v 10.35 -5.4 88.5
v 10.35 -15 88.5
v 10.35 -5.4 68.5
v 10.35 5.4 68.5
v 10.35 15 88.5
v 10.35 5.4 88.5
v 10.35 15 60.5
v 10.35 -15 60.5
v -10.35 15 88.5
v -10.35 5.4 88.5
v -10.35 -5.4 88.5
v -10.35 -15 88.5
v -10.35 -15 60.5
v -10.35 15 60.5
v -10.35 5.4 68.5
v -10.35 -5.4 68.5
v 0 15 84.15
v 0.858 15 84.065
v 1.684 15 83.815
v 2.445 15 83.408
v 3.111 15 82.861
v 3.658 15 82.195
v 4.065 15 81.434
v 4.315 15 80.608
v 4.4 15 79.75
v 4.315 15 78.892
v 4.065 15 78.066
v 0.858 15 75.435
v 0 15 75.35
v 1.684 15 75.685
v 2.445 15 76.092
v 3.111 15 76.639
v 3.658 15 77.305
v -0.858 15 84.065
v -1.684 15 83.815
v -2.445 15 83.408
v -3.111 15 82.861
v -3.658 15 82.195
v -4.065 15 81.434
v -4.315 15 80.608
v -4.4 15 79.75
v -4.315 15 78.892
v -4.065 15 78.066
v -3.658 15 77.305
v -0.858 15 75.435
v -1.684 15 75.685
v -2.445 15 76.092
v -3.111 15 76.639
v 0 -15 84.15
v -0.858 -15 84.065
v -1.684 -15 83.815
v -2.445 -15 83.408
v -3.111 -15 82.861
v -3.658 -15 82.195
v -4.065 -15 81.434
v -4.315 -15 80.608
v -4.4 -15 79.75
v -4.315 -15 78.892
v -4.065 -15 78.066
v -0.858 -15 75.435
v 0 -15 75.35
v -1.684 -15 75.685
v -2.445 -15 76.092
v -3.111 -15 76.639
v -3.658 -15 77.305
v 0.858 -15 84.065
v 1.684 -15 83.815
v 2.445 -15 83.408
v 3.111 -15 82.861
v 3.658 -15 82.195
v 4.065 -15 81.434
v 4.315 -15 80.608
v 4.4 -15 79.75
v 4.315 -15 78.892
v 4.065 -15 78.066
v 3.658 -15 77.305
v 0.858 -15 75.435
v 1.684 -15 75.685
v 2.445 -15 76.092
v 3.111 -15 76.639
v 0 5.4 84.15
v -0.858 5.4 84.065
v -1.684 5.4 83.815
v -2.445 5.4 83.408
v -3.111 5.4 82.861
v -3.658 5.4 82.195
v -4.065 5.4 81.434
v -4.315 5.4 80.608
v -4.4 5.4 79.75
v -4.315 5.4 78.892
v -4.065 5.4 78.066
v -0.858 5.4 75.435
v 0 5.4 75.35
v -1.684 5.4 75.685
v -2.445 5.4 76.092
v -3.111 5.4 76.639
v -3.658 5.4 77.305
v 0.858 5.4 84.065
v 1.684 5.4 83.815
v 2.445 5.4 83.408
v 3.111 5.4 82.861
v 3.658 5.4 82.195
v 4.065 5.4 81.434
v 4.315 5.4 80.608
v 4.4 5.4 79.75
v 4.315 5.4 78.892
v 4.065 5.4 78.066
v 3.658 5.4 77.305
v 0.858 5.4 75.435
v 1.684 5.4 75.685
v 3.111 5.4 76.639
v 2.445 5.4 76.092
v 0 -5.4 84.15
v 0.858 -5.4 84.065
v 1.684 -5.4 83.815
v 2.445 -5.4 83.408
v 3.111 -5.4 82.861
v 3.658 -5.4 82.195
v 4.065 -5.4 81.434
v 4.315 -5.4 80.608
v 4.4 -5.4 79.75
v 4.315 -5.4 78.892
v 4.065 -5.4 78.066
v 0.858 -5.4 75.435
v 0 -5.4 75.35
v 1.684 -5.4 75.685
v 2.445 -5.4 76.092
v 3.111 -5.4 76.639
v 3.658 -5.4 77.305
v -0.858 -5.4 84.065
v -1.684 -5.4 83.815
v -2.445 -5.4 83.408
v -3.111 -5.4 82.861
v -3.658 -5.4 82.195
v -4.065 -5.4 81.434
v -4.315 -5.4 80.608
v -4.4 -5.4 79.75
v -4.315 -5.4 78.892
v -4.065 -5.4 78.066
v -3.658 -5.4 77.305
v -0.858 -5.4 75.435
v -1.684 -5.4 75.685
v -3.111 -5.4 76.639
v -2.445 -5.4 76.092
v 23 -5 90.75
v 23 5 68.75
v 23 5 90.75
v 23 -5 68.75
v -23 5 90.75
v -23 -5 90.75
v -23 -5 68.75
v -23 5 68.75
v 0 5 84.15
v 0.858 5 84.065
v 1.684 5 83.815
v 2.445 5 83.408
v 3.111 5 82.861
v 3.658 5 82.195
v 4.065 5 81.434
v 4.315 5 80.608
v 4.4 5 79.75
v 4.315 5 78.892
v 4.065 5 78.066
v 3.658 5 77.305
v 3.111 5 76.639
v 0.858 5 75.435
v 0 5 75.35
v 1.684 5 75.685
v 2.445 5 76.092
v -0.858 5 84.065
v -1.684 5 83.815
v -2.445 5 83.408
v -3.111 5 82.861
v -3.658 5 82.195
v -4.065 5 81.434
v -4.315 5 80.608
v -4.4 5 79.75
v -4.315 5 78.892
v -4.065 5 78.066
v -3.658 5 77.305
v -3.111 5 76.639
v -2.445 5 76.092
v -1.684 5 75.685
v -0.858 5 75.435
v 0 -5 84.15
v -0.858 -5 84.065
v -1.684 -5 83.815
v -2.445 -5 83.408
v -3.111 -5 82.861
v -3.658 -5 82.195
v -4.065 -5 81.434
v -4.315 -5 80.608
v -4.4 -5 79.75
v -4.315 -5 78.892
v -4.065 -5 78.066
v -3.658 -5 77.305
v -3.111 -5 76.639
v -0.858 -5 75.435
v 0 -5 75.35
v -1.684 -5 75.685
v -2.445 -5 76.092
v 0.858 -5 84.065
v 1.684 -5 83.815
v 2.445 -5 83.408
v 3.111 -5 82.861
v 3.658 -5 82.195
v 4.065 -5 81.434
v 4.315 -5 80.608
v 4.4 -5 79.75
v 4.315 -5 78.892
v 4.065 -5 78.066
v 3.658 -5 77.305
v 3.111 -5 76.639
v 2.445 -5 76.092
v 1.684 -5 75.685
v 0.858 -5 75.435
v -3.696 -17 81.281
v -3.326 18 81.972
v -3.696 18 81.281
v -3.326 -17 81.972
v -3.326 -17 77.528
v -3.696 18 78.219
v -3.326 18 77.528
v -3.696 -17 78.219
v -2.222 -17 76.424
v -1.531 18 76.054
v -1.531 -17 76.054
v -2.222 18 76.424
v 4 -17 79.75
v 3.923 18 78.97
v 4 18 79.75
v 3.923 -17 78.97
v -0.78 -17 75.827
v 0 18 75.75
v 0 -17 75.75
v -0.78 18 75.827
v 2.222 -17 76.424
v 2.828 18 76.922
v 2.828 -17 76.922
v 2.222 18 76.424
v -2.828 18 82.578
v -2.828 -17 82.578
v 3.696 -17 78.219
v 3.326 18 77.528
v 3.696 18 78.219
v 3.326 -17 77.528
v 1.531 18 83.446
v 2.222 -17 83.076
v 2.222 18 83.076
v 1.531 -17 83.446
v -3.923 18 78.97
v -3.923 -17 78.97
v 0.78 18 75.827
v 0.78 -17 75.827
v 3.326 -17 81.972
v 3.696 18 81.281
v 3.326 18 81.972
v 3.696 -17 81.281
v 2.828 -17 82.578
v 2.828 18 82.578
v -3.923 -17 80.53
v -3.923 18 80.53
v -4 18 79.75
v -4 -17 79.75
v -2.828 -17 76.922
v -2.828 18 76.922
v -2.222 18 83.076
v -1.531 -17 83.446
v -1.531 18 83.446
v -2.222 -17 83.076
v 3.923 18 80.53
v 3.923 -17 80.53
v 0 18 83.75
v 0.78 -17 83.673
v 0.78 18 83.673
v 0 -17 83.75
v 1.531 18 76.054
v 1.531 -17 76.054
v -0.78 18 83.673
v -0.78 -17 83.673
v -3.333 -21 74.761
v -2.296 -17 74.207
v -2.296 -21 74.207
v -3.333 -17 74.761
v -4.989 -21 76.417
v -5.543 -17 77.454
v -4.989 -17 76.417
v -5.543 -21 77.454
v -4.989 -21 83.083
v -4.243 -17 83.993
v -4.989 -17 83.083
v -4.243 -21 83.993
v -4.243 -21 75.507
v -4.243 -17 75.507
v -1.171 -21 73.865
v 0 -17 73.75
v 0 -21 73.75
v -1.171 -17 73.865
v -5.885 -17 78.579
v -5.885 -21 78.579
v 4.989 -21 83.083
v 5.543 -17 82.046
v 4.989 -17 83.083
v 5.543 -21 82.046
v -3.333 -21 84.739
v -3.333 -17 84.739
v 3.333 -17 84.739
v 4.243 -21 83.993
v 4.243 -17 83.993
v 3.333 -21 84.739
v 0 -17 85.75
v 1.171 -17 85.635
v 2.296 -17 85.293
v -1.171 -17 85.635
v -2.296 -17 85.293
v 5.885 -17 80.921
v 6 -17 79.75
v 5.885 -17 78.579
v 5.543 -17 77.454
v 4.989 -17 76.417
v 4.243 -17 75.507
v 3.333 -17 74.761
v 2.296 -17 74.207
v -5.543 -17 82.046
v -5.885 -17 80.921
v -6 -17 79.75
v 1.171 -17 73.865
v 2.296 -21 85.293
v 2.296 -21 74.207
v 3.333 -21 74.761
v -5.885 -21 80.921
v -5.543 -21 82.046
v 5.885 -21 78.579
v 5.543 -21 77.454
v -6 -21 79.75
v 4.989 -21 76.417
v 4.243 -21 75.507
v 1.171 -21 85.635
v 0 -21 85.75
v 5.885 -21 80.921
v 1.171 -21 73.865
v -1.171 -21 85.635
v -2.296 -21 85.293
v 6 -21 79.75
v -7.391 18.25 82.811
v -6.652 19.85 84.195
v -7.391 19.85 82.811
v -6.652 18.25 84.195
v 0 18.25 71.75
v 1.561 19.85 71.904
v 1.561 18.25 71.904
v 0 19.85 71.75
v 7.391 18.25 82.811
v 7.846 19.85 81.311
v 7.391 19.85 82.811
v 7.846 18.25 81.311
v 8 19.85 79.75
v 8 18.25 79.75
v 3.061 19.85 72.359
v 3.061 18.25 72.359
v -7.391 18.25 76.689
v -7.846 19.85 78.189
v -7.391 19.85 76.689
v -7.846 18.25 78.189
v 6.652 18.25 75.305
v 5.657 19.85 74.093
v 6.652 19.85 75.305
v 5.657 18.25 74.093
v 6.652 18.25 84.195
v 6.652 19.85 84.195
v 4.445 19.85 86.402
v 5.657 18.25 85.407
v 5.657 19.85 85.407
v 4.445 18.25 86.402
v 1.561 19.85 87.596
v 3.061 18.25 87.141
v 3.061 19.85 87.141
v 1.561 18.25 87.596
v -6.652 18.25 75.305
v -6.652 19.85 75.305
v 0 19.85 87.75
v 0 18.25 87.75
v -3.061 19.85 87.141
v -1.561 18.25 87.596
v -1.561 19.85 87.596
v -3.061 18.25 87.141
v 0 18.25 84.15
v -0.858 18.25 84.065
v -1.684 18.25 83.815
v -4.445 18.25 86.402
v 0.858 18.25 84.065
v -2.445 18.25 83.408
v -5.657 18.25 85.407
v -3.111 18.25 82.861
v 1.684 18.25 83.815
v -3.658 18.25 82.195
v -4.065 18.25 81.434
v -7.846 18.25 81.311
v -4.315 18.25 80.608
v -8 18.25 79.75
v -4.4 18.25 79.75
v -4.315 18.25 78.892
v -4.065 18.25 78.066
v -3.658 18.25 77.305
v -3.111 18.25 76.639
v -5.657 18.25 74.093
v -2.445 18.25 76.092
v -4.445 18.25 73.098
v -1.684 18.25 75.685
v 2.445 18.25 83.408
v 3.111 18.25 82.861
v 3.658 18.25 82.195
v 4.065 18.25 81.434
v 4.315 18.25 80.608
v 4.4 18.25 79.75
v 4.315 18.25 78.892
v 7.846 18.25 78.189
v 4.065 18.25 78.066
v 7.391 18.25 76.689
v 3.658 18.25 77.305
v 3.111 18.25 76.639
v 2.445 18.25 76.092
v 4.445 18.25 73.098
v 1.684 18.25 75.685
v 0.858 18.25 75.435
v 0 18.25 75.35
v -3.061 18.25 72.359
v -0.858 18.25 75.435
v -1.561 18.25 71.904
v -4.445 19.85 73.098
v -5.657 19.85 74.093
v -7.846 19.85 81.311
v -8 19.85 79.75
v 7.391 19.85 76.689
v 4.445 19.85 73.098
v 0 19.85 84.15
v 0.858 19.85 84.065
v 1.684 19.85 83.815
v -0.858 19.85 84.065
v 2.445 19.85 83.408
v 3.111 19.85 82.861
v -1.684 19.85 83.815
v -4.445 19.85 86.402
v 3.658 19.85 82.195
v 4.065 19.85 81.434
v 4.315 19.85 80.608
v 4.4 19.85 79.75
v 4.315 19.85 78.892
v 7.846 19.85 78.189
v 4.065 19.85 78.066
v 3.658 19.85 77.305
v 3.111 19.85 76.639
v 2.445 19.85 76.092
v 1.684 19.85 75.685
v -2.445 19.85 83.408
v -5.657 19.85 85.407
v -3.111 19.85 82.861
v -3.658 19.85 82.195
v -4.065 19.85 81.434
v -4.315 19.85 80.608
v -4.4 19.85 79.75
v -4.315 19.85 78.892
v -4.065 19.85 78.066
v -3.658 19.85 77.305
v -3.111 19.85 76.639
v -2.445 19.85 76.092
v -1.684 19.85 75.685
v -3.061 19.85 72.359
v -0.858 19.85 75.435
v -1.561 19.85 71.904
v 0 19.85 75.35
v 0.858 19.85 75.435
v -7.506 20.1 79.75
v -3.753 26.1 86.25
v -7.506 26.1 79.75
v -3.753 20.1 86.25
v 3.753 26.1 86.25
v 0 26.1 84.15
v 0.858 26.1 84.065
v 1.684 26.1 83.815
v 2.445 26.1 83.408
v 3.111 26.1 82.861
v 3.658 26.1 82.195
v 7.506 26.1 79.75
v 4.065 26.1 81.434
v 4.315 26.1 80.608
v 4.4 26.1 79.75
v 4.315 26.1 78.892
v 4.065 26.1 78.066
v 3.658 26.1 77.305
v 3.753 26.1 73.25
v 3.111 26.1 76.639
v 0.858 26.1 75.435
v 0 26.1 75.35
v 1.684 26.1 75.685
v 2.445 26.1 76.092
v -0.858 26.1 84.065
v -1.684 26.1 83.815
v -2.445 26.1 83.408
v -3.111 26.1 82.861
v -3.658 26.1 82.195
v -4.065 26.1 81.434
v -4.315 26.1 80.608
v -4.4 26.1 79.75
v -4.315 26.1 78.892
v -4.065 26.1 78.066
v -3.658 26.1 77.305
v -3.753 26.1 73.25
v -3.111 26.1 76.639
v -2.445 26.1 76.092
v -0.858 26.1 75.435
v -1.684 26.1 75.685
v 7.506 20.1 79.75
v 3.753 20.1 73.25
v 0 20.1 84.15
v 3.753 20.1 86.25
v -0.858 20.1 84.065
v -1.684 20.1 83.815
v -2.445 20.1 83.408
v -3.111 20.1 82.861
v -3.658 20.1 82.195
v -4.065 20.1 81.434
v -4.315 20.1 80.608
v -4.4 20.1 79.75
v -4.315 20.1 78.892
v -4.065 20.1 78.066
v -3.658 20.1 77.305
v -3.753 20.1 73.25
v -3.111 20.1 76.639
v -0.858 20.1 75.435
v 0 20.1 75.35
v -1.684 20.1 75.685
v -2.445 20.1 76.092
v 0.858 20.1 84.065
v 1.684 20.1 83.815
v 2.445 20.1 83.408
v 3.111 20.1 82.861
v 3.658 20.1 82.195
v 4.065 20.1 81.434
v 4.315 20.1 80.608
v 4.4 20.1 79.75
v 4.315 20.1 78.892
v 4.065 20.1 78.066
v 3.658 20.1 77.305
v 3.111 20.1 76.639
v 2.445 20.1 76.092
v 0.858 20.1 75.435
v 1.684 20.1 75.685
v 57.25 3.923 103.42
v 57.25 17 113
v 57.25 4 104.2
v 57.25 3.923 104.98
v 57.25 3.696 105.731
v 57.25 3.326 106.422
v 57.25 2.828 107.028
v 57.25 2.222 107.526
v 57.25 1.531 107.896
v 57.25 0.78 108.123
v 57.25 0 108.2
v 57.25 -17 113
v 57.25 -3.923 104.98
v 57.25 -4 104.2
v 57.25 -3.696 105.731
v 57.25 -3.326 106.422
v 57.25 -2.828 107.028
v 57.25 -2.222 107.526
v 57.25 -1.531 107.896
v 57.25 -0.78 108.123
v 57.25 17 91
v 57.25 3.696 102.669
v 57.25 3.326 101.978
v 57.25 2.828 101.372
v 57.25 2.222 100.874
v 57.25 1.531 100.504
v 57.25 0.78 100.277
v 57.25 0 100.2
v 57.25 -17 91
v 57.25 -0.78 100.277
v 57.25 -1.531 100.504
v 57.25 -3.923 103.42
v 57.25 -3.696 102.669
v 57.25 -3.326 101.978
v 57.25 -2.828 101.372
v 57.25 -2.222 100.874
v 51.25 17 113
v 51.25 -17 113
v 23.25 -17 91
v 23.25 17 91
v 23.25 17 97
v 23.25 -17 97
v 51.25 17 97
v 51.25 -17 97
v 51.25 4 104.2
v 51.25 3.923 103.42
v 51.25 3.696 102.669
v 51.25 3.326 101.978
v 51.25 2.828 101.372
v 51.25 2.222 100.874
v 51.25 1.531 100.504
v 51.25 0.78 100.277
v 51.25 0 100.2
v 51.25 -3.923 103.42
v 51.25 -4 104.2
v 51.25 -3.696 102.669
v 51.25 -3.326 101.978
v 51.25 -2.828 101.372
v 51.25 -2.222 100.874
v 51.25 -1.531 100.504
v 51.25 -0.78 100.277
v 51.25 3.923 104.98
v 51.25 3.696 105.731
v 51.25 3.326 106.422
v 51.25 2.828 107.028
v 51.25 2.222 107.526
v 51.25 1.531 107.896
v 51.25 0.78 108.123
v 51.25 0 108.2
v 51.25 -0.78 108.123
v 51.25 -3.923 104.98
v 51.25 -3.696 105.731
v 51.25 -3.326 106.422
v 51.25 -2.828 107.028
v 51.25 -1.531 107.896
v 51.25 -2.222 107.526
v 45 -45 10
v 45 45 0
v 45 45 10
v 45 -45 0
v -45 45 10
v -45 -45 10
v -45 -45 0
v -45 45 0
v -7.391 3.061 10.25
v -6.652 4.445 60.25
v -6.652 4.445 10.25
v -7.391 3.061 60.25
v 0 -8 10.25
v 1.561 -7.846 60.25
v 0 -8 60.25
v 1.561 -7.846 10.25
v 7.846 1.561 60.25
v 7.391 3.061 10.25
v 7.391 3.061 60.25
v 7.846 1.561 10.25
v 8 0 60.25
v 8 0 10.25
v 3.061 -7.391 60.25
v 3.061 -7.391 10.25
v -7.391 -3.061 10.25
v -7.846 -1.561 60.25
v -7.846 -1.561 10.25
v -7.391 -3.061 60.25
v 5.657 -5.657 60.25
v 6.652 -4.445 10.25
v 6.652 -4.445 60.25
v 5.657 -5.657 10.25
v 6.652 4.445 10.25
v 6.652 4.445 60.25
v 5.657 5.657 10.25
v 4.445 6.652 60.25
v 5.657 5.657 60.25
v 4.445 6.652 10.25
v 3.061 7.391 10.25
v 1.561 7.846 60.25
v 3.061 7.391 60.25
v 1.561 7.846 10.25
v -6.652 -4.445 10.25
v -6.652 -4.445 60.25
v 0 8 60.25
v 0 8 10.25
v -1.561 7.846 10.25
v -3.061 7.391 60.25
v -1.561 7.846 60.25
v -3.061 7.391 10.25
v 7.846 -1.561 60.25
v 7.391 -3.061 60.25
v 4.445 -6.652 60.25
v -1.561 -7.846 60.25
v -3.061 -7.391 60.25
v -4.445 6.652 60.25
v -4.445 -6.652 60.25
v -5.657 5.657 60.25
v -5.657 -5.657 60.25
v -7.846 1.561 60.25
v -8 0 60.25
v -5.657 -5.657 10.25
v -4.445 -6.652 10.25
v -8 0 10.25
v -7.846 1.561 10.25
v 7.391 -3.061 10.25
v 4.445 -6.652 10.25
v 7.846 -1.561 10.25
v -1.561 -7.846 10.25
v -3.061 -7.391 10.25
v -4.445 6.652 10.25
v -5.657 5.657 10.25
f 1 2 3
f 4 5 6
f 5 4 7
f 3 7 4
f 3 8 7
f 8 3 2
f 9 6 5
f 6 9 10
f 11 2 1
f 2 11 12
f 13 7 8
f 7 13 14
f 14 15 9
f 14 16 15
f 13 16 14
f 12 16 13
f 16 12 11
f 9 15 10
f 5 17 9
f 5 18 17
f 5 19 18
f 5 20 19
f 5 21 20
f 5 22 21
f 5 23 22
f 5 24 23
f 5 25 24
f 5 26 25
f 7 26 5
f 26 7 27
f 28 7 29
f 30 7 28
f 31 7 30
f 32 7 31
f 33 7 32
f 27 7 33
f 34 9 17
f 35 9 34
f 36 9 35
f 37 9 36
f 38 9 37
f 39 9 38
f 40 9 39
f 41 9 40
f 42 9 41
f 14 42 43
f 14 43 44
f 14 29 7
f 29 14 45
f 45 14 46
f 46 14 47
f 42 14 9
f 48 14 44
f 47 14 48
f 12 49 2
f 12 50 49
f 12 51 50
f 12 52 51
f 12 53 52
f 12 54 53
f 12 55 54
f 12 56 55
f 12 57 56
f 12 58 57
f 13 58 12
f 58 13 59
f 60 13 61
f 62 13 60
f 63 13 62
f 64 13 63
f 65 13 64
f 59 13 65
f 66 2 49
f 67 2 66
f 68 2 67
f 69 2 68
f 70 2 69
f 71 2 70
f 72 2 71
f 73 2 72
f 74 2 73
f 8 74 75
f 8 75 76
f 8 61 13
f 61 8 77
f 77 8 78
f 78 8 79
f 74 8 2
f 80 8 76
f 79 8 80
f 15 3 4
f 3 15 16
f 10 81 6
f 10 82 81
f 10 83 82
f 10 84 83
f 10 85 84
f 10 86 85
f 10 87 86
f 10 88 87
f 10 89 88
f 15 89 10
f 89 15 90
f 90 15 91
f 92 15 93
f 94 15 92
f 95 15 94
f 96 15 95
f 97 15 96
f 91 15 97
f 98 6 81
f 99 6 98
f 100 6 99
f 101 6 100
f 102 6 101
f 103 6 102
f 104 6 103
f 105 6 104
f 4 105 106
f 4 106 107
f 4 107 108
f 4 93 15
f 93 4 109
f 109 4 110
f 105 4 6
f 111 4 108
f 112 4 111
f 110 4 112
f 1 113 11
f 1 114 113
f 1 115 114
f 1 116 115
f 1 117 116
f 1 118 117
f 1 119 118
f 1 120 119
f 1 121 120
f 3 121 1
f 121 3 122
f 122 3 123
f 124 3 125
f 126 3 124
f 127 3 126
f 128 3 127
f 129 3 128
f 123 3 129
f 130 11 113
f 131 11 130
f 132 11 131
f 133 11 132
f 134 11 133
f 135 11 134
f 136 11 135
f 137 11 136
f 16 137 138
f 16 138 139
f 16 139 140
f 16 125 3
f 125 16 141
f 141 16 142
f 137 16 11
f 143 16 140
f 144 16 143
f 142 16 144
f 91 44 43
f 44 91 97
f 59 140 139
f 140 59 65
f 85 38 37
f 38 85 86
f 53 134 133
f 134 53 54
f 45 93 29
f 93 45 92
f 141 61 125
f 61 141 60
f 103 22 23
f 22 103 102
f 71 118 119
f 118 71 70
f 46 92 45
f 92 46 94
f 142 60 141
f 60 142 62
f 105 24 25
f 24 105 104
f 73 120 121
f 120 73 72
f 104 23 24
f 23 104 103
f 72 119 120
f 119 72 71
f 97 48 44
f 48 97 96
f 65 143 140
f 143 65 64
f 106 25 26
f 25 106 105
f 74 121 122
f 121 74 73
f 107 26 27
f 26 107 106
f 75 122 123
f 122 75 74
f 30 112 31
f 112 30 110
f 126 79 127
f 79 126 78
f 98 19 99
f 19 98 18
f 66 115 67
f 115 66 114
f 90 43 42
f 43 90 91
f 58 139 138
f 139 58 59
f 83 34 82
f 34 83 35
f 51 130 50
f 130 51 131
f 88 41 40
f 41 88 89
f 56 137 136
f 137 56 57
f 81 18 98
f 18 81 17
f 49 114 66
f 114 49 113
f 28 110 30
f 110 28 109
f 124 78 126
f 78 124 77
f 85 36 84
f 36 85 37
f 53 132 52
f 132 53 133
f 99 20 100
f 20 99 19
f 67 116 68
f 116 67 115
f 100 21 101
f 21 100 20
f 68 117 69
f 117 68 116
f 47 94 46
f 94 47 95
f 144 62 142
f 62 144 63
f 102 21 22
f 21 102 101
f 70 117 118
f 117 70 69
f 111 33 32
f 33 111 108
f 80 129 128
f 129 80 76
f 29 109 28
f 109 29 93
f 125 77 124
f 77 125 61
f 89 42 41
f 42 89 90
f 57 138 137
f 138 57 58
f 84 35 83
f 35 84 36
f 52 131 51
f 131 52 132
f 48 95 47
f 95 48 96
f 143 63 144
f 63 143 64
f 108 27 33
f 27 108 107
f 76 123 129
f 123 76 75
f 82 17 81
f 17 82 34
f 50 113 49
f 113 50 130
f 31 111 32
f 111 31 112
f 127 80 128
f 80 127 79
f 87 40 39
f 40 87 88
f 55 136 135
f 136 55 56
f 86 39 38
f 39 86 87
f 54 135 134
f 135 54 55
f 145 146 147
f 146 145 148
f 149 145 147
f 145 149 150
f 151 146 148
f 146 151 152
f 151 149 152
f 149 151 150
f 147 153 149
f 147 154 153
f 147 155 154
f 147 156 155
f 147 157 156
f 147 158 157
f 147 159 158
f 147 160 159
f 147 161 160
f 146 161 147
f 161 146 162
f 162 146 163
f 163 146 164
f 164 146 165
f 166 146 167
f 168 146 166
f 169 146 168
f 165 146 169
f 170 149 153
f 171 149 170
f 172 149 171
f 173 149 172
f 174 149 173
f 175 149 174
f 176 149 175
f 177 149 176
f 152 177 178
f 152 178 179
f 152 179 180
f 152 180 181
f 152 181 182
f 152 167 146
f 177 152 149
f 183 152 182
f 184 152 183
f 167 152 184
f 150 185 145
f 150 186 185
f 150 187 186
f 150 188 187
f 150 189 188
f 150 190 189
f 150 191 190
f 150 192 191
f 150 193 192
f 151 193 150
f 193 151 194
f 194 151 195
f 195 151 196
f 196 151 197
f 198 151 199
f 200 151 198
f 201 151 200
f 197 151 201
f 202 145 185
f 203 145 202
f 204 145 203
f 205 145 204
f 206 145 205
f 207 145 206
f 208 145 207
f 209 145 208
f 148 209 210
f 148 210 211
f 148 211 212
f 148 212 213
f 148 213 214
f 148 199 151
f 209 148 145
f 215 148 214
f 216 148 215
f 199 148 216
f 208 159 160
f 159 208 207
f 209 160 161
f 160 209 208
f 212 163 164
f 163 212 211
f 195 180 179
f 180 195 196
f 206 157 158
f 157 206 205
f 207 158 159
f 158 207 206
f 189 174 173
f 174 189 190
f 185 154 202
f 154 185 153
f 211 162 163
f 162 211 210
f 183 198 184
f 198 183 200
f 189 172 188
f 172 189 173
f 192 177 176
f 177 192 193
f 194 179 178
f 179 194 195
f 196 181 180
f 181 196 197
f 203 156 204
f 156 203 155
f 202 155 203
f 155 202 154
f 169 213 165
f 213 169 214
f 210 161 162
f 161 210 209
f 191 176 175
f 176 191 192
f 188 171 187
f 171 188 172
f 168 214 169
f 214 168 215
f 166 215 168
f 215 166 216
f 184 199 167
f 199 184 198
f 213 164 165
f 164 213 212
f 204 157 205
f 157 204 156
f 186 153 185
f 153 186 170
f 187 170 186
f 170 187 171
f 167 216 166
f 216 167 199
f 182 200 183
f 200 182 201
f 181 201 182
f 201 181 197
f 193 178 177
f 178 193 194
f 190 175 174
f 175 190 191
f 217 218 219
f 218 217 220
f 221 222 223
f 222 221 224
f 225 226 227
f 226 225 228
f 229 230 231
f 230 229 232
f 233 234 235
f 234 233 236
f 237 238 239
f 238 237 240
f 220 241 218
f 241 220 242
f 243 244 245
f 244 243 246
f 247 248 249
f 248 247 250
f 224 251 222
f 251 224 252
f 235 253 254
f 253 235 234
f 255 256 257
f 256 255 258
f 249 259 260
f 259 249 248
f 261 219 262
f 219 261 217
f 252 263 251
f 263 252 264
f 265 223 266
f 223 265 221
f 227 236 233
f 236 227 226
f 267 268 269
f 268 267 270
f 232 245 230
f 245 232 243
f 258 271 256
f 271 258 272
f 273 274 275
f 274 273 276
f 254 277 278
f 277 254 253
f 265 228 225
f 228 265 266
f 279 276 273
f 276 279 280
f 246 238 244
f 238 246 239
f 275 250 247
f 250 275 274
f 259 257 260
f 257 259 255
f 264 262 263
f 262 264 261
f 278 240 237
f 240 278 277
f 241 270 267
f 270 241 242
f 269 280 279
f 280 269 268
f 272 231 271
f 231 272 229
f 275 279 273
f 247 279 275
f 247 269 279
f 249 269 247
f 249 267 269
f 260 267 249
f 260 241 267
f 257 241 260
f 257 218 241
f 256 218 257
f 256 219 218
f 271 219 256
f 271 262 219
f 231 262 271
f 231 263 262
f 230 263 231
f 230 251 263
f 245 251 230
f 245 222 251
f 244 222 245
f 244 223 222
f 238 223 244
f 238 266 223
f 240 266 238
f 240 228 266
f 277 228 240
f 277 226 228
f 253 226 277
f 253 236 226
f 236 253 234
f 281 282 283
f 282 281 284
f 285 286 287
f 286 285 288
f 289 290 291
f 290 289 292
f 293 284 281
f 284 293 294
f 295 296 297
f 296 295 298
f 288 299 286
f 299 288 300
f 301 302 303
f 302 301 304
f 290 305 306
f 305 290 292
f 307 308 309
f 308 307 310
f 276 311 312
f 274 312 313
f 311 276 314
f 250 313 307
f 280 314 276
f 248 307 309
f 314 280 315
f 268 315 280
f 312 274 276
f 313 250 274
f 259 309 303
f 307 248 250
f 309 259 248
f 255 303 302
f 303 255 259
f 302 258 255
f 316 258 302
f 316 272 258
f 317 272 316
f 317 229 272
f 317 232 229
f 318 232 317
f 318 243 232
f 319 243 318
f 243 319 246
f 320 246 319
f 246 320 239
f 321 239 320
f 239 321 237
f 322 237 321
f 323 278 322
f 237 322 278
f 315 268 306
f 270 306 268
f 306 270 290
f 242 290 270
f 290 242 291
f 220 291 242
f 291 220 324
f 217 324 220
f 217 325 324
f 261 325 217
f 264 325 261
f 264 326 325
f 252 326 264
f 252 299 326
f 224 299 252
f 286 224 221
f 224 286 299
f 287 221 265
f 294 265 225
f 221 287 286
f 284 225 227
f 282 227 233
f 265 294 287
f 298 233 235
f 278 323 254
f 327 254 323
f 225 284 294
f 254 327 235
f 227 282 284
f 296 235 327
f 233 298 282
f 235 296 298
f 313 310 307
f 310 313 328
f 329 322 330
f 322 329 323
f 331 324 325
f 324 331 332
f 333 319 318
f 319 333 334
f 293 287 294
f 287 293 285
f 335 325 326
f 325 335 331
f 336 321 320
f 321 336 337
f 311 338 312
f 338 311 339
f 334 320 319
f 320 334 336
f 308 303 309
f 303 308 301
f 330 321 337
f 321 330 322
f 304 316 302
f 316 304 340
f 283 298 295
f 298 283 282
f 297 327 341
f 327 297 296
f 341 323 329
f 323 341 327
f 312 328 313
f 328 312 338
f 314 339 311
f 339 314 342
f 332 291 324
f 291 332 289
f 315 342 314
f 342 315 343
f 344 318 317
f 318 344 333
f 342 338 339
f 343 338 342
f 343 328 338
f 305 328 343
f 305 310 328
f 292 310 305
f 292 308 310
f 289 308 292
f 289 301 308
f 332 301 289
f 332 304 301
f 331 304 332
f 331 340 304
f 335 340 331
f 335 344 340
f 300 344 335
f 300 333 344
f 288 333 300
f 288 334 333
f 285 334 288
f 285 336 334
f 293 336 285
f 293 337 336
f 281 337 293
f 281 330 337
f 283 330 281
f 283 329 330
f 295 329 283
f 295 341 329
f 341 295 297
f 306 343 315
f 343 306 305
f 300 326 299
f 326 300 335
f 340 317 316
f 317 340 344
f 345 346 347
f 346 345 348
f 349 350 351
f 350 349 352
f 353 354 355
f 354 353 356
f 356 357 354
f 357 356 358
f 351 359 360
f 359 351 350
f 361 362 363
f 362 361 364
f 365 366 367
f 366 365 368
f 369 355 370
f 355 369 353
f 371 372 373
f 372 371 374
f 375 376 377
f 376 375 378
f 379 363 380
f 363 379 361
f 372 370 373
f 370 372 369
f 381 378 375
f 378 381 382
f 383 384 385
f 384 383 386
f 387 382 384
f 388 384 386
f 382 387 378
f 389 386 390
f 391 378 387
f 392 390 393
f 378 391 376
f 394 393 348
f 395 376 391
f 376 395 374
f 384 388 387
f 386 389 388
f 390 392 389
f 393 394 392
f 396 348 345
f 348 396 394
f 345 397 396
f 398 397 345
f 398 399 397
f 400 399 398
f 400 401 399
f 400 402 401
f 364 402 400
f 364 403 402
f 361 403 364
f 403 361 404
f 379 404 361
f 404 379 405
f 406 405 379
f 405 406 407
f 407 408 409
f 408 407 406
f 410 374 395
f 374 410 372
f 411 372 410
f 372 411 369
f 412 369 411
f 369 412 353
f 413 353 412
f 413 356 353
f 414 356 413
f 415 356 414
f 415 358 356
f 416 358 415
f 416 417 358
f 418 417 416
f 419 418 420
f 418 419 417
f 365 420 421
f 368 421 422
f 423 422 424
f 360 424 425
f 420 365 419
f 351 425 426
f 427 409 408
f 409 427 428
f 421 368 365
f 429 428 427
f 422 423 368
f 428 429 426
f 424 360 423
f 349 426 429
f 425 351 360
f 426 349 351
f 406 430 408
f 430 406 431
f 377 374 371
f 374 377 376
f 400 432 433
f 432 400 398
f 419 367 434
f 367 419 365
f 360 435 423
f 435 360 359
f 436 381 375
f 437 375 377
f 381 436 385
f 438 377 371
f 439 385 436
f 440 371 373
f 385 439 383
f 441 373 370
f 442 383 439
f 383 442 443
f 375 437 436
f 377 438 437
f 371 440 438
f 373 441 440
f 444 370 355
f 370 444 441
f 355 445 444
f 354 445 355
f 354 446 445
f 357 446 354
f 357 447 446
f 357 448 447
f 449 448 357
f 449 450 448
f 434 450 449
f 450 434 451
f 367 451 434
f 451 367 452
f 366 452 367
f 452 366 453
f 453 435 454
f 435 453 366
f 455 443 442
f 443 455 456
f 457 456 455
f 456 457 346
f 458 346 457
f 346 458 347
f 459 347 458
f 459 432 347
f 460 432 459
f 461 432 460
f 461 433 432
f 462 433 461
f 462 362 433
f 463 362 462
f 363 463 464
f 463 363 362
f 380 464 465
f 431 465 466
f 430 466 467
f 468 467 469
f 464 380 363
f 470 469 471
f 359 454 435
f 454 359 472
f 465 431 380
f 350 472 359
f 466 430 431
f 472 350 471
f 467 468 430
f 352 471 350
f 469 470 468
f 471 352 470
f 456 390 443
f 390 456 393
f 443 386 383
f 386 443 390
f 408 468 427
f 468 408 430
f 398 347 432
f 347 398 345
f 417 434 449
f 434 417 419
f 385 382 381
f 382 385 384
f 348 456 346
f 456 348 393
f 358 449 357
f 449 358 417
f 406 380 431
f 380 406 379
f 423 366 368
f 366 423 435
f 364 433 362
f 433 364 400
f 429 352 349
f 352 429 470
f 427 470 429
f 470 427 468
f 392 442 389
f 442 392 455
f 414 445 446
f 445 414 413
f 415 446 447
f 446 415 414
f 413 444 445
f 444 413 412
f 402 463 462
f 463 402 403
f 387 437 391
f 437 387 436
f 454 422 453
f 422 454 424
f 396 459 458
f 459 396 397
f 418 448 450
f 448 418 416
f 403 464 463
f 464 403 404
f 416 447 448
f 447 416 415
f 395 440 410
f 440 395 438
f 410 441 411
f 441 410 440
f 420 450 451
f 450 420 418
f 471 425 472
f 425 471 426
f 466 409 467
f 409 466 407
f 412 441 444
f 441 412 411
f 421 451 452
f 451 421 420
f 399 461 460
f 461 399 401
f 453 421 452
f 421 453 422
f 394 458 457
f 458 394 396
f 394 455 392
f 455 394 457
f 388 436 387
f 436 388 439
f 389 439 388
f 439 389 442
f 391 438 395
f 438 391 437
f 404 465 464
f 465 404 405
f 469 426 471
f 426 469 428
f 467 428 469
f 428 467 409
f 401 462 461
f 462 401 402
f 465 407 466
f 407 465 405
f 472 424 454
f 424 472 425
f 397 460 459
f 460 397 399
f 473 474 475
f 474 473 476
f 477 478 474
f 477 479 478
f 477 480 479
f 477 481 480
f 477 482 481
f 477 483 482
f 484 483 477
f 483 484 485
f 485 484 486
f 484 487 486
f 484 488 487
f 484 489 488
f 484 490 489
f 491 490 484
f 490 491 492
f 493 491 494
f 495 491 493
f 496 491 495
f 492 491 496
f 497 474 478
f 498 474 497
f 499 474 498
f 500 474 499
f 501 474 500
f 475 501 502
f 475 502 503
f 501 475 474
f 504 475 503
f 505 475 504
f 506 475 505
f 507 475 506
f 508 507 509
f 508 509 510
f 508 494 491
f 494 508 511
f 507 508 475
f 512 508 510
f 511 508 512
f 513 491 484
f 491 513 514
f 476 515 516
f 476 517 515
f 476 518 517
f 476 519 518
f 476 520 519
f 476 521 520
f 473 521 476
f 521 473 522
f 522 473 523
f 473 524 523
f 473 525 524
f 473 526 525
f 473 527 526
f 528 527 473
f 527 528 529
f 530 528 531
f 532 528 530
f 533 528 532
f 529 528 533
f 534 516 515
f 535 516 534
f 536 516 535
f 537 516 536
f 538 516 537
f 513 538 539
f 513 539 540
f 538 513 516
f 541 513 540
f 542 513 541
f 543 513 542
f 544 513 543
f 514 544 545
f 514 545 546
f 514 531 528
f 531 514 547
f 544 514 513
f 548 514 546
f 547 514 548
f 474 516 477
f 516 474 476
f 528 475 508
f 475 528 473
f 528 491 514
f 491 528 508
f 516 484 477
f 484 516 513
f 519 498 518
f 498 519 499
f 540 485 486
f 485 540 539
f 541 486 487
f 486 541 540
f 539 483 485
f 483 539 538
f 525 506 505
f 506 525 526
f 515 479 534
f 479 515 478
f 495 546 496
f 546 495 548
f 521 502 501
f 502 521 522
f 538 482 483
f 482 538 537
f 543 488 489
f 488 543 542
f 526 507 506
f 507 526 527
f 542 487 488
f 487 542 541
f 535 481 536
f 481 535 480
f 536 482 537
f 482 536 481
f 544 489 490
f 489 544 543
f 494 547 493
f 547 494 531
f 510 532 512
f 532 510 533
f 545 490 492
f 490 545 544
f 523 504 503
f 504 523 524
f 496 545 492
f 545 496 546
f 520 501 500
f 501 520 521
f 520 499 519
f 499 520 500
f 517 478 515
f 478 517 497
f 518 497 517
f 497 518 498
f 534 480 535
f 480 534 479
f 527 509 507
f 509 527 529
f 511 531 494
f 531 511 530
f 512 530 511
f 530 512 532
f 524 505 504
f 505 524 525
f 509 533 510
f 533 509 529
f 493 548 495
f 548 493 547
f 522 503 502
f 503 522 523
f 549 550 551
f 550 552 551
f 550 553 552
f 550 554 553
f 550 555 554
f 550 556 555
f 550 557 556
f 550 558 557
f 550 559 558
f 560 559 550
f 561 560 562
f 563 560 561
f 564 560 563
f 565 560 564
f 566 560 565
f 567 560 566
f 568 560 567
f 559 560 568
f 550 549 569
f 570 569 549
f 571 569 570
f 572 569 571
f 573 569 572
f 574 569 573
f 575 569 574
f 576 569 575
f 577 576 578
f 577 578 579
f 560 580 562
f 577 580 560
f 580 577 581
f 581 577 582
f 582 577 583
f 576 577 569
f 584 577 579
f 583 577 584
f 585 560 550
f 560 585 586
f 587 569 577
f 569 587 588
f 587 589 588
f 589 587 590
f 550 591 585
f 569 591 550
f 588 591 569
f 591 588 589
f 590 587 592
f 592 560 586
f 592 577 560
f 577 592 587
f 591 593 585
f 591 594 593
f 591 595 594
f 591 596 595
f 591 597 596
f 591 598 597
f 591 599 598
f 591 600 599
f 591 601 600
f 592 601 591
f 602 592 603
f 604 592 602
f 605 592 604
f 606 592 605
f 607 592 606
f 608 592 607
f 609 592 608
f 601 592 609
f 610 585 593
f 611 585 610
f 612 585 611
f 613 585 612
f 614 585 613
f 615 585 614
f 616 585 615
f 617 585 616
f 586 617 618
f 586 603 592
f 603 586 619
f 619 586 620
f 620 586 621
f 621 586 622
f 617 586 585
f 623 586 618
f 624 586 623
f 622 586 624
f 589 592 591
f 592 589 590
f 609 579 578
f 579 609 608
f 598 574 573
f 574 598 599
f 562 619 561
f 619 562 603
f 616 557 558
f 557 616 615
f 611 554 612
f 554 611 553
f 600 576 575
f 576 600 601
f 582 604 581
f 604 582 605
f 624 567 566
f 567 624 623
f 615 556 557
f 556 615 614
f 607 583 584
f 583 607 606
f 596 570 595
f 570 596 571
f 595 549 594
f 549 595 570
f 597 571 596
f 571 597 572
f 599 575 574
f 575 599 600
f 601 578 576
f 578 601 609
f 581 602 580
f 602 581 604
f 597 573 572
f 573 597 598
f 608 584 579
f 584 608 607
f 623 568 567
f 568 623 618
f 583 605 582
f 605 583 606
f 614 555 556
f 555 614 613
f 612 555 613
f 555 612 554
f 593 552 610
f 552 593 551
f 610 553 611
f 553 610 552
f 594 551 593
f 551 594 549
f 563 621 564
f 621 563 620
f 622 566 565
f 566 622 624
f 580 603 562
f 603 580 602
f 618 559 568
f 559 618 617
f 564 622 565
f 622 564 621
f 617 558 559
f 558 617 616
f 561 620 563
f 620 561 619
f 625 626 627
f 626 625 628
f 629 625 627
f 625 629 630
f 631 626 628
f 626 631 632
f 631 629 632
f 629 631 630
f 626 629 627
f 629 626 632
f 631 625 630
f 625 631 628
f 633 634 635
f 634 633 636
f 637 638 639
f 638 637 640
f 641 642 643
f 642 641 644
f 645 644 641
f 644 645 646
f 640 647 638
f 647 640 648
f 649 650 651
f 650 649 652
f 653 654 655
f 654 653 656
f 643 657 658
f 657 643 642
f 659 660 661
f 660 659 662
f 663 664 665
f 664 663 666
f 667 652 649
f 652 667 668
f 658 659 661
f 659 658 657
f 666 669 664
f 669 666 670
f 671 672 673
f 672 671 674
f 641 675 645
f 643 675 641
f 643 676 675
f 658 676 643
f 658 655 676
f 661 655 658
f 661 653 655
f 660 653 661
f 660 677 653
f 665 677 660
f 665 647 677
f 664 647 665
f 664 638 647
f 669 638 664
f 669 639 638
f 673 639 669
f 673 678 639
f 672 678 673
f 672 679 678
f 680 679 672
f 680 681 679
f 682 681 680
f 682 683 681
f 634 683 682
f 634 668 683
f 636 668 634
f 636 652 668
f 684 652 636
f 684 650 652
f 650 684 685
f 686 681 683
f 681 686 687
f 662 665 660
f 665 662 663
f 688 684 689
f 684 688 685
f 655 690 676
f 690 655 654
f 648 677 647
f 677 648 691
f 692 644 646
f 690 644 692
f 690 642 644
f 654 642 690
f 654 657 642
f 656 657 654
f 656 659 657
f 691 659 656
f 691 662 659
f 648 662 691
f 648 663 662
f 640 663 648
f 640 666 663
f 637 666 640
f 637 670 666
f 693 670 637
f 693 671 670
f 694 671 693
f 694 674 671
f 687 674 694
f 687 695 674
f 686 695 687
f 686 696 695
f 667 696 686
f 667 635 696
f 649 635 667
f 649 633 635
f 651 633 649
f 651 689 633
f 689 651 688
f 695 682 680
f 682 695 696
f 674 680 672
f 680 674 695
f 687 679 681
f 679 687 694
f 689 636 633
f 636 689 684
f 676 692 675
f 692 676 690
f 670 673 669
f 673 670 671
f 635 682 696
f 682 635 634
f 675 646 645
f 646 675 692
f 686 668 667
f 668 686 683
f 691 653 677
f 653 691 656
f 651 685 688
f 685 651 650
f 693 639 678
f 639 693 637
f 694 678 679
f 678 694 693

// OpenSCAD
$fn = 32;

// ------------------------------------------------------------------------
// Lamp arm: column d16 x 50 mm, arm 46 mm
// Every part is its own module, assembly() places every instance.
// ------------------------------------------------------------------------

// --- part 1 ---
module lamp_base() {
  difference() {
    translate([-45, -45, 0]) cube([90, 90, 10]);
  }
}

// --- part 2 ---
module lamp_column() {
  cylinder(h = 50, d = 16);
}

// --- part 3 ---
module head_fork() {
  difference() {
    translate([-10.35, -15, 0]) cube([20.7, 30, 28]);
    translate([-11.35, -5.4, 8]) cube([22.7, 10.8, 21]);
    translate([0, 0, 19.25]) rotate([90, 0, 0]) cylinder(h = 32, d = 8.8, center = true);
  }
}

// --- part 4 ---
module lamp_arm() {
  difference() {
    translate([-23, -5, 0]) cube([46, 10, 22]);
    translate([0, 0, 11]) rotate([90, 0, 0]) cylinder(h = 12, d = 8.8, center = true);
  }
}

// --- part 5 ---
module arm_pin() {
  rotate([0, 90, 0]) cylinder(h = 36, d = 8, center = true);
  translate([-21, 0, 0]) rotate([0, 90, 0]) cylinder(h = 4, d = 12);
}

// --- part 6 ---
module arm_washer() {
  difference() {
      translate([0, 0, 0]) cylinder(h = 1.6, d = 16);
      translate([0, 0, -1]) cylinder(h = 3.6, d = 8.8);
    }
}

// --- part 7 ---
module arm_nut() {
  difference() {
    linear_extrude(height = 6) polygon(points = [[7.506, 0], [3.753, 6.5], [-3.753, 6.5], [-7.506, 0], [-3.753, -6.5], [3.753, -6.5]]);
    translate([0, 0, -1]) cylinder(h = 8, d = 8.8);
  }
}

// --- part 8 ---
module shade_bracket() {
  difference() {
    translate([-17, -17, 0]) cube([34, 34, 22]);
    translate([-18, -18, 6]) cube([29, 36, 17]);
    translate([14, 0, 13.2]) rotate([0, 90, 0]) cylinder(h = 8, d = 8, center = true);
  }
}

// --- assembly ---
module assembly() {
  color([0.80, 0.24, 0.20]) translate([0, 0, 0]) rotate([0, 0, 0]) lamp_base();
  color([0.20, 0.45, 0.75]) translate([0, 0, 10.25]) rotate([0, 0, 0]) lamp_column();
  color([0.25, 0.62, 0.32]) translate([0, 0, 60.5]) rotate([0, 0, 0]) head_fork();
  color([0.92, 0.70, 0.18]) translate([0, 0, 68.75]) rotate([0, 0, 0]) lamp_arm();
  color([0.58, 0.35, 0.70]) translate([0, 0, 79.75]) rotate([0, 0, 90]) arm_pin();
  color([0.16, 0.66, 0.66]) translate([0, 19.85, 79.75]) rotate([90, 0, 0]) arm_washer();
  color([0.85, 0.48, 0.18]) translate([0, 26.1, 79.75]) rotate([90, 0, 0]) arm_nut();
  color([0.55, 0.60, 0.65]) translate([40.25, 0, 91]) rotate([0, 0, 0]) shade_bracket();
}

assembly();
